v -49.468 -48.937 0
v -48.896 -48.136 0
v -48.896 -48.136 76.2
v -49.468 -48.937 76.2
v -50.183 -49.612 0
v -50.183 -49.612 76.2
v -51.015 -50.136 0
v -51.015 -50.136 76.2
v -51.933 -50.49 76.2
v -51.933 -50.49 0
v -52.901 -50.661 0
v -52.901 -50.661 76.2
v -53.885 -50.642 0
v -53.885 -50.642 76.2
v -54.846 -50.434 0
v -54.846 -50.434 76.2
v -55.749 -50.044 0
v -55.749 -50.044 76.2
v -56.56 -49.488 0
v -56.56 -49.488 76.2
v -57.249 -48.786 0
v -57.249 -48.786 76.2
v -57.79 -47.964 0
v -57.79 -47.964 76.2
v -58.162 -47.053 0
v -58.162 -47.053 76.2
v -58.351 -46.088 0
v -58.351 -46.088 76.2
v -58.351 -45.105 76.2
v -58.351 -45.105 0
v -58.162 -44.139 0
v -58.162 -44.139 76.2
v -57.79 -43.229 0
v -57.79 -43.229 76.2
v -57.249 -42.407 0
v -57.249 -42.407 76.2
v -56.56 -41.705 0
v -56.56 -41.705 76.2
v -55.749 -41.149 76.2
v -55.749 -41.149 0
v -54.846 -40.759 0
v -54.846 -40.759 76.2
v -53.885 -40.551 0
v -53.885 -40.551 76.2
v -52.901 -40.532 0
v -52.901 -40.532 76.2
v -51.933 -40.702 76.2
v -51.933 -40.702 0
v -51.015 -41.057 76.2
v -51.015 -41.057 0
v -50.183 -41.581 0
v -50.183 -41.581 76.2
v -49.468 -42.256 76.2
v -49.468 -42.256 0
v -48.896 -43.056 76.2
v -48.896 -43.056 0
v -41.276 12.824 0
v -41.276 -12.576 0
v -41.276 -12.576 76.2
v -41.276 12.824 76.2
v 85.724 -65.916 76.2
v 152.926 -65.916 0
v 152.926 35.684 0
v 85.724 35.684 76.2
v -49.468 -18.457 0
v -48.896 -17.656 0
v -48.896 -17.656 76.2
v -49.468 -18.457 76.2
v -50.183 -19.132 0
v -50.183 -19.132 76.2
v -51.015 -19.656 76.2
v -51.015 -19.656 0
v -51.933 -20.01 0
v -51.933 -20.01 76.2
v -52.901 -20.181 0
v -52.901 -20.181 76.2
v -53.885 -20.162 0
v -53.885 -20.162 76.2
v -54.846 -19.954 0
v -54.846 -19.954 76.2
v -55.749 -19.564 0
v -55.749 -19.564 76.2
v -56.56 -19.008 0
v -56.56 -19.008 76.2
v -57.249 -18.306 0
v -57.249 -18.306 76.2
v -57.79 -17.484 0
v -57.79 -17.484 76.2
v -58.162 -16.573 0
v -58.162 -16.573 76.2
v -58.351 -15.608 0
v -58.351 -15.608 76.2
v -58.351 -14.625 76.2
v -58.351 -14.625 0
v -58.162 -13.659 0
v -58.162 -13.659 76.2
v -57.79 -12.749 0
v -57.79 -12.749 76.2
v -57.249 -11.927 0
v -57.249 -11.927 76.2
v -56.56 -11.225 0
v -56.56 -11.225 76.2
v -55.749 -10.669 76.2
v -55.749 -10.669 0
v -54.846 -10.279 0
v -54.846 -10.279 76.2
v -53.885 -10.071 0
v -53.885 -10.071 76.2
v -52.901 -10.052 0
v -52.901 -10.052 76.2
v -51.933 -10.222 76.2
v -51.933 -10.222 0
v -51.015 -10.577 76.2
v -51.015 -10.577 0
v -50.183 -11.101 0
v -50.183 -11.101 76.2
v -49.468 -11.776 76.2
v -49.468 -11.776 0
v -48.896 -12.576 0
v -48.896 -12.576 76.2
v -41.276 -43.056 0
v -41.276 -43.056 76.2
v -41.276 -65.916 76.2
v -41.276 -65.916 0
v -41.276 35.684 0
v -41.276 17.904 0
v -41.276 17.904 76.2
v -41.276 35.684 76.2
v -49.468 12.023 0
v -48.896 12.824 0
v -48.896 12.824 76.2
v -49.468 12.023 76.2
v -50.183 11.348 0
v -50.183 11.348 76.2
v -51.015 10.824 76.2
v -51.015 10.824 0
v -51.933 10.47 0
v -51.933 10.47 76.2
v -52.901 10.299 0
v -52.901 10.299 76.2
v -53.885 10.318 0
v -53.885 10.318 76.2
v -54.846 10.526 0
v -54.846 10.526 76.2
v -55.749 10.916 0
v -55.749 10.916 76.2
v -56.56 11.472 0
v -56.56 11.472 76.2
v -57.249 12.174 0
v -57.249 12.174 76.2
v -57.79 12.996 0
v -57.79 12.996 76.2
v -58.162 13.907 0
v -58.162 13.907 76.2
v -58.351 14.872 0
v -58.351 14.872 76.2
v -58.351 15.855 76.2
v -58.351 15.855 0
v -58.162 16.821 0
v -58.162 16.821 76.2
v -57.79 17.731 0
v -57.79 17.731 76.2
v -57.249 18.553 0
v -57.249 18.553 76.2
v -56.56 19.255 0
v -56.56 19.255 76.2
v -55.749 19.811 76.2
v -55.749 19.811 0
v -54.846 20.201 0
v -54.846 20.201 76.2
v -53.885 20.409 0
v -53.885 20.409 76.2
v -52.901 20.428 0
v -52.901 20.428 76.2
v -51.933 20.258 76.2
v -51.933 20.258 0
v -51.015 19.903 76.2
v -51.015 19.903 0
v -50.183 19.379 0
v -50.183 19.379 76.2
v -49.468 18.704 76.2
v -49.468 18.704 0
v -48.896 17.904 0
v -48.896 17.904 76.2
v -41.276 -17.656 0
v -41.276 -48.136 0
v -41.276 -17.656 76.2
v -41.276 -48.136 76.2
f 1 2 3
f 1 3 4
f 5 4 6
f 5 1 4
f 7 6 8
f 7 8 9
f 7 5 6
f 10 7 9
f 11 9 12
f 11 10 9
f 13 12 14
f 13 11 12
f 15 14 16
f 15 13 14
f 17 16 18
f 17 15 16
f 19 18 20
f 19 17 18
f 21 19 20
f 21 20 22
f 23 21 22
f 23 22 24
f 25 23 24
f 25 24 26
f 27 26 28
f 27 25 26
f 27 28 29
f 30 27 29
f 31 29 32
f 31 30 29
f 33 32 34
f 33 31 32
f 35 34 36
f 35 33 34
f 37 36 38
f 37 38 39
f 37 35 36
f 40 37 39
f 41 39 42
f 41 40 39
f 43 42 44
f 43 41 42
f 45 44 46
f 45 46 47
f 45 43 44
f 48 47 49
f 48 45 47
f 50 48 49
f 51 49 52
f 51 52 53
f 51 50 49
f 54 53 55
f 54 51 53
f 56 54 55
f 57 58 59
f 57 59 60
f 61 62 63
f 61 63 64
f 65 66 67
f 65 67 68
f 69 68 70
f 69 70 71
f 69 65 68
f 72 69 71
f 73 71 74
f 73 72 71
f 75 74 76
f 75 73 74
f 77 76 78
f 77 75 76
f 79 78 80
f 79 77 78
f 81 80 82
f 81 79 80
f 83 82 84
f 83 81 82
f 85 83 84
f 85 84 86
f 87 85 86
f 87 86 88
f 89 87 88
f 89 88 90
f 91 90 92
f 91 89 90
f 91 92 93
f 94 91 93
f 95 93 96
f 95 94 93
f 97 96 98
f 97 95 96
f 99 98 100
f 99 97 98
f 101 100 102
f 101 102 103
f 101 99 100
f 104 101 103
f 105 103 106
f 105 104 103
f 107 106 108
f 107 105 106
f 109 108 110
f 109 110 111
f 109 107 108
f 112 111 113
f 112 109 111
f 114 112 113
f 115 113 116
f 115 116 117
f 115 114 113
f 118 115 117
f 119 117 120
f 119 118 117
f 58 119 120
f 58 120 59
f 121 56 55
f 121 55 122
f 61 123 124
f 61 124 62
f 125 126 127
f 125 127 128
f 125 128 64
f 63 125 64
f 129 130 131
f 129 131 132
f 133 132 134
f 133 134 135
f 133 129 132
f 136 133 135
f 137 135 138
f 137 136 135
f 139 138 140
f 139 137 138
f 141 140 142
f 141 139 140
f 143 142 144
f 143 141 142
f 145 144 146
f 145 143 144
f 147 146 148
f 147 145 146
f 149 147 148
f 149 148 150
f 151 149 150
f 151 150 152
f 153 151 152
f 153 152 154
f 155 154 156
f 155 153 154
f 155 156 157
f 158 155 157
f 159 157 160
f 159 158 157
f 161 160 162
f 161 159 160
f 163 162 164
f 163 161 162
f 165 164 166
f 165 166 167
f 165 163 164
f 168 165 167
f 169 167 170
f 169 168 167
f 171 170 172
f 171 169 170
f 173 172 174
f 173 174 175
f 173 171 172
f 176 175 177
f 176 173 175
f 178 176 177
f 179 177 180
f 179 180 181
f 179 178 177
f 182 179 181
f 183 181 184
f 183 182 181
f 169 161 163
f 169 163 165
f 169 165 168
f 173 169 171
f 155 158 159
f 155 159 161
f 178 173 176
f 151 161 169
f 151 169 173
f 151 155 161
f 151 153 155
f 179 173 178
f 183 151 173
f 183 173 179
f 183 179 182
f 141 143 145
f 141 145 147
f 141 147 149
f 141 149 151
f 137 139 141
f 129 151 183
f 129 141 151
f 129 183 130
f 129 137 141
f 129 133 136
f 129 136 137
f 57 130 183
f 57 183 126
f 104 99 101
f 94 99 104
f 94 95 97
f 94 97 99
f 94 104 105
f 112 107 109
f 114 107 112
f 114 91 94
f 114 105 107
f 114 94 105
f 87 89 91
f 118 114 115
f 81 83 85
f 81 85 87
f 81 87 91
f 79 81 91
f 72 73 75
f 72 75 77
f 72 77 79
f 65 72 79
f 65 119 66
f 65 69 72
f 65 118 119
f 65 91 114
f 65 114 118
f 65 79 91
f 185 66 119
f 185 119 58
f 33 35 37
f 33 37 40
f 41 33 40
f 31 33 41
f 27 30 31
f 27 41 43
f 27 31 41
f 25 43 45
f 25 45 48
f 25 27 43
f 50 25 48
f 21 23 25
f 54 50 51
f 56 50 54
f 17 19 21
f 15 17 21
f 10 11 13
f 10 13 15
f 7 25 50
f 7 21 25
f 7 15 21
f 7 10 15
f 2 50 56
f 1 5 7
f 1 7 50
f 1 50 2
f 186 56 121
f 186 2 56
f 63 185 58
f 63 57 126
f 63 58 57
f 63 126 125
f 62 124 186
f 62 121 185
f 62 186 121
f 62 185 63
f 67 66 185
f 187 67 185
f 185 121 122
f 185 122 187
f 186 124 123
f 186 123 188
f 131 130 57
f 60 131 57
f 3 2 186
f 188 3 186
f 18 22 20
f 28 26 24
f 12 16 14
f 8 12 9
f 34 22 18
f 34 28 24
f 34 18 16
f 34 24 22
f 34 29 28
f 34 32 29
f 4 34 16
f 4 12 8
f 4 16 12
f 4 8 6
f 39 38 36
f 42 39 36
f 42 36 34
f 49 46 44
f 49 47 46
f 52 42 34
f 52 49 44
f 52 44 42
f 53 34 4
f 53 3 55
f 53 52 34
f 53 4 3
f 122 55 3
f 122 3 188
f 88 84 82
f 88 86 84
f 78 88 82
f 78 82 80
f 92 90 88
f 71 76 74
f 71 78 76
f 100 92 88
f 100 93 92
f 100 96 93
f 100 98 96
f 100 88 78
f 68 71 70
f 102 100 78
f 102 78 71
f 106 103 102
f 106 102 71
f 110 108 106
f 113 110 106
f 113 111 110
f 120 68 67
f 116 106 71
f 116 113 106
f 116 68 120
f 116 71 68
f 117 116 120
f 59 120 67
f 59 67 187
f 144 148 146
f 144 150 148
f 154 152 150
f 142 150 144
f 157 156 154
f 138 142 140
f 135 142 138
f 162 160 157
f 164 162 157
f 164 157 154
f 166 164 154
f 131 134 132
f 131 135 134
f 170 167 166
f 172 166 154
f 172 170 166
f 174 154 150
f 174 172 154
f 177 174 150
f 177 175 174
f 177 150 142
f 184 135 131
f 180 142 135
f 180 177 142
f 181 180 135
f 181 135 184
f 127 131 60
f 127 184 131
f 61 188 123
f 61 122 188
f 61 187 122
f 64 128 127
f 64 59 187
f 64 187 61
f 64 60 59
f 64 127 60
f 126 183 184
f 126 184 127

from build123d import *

# Parameters (mm, degrees)
F0_W     = 127
F0_H     = 101.6
F1_DEPTH = 76.2
F3_DEPTH = 101.6
F4_W     = 7.62
F4_H     = 5.08
F5_DEPTH = 76.2


with BuildPart() as f1:
    # F0 (on Top) → F1 (new body)
    with BuildSketch(Plane.XY):
        with Locations((22.224299, -15.116411)):
            Rectangle(F0_W, F0_H)
    extrude(amount=F1_DEPTH)

    # F2 (on face) → F3 (join)
    with BuildSketch(Plane.XZ.offset(65.916411)):
        Polygon((152.926383, 0), (85.724299, 76.2), (85.724299, 0), align=None)
    extrude(amount=-F3_DEPTH)

    # F4 (on face) → F5 (join)
    with BuildSketch(Plane(origin=(0, 0, 0), x_dir=(1, 0, 0), z_dir=(0, 0, -1))):
        with Locations((-45.085701, -15.363589)):
            Rectangle(F4_W, F4_H)
        with BuildLine():
            ThreePointArc((-48.895701, 48.136411), (-58.37511, 45.596411), (-48.895701, 43.056411))
            Line((-48.895701, 43.056411), (-48.895701, 48.136411))
        make_face()
        with Locations((-45.085701, 45.596411)):
            Rectangle(F4_W, F4_H)
        with BuildLine():
            ThreePointArc((-48.895701, 17.656411), (-58.37511, 15.116411), (-48.895701, 12.576411))
            Line((-48.895701, 12.576411), (-48.895701, 17.656411))
        make_face()
        with Locations((-45.085701, 15.116411)):
            Rectangle(F4_W, F4_H)
        with BuildLine():
            ThreePointArc((-48.895701, -12.823589), (-58.37511, -15.363589), (-48.895701, -17.903589))
            Line((-48.895701, -17.903589), (-48.895701, -12.823589))
        make_face()
    extrude(amount=-F5_DEPTH)


solid = f1.part
